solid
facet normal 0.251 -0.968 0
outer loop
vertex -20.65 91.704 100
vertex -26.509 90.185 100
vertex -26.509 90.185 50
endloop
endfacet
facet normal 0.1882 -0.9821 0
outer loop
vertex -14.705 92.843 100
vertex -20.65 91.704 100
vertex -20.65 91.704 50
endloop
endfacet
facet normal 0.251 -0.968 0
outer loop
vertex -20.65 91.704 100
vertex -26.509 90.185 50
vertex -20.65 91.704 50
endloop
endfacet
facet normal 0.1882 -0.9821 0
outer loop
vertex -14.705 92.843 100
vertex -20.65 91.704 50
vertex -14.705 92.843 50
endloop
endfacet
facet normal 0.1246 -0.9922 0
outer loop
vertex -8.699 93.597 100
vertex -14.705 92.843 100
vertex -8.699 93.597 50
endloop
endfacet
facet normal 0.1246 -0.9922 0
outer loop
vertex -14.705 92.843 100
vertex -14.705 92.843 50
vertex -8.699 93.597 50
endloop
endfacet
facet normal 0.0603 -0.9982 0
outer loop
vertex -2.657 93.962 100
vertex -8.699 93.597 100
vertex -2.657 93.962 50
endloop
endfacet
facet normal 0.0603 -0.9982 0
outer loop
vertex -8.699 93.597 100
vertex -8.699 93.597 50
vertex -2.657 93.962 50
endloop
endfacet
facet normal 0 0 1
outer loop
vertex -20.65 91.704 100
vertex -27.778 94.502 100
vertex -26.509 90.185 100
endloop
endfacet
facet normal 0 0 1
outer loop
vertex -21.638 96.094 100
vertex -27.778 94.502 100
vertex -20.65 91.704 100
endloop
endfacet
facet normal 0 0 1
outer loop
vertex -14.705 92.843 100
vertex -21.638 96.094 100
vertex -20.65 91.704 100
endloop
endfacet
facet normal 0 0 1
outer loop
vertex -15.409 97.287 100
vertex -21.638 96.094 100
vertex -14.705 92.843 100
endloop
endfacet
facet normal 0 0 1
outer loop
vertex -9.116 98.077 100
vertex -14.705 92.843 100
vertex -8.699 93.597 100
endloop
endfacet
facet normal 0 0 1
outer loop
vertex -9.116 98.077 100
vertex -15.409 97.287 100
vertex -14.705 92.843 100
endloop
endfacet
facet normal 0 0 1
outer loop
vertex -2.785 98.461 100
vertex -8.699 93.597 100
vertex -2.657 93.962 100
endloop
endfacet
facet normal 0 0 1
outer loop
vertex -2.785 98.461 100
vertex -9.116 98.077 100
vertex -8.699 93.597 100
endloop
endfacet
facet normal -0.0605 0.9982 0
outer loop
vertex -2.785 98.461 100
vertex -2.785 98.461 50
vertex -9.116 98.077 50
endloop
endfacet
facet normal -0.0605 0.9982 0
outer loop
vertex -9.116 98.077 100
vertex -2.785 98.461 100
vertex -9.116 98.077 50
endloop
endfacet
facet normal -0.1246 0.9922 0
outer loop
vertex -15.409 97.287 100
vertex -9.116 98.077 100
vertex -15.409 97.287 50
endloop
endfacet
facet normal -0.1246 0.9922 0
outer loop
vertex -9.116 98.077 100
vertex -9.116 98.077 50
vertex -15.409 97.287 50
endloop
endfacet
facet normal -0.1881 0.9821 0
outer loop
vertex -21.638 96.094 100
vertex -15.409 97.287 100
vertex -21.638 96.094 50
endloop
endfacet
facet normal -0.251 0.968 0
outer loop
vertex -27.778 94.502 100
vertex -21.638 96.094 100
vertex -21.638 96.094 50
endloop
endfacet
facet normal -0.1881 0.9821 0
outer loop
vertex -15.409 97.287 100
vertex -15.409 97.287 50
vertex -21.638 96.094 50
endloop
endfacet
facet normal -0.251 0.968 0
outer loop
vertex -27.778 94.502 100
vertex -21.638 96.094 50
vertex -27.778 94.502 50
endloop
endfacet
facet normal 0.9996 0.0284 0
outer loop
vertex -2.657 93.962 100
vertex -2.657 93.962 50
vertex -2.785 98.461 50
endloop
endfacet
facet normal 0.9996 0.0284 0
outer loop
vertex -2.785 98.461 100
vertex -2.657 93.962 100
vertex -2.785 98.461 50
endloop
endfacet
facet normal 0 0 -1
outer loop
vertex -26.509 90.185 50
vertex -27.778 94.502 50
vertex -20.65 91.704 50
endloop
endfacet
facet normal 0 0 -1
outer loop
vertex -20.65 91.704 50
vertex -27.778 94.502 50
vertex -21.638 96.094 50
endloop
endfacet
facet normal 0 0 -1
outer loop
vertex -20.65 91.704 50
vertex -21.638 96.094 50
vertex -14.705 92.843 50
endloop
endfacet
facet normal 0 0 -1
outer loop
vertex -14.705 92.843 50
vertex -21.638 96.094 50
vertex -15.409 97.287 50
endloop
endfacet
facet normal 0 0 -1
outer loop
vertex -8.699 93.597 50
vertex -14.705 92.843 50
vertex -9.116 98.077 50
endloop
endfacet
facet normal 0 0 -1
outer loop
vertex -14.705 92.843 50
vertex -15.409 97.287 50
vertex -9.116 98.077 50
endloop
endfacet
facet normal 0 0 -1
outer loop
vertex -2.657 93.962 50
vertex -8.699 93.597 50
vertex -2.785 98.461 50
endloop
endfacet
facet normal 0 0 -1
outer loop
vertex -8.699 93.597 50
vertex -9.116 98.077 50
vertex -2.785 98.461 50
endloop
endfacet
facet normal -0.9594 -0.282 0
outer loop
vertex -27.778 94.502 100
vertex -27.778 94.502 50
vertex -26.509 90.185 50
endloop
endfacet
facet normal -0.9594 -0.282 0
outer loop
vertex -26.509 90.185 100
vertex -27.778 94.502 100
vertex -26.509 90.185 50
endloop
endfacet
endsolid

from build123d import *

# Parameters (mm, degrees)
Y_KSEKLIK_EKSTR_ZYON1_DEPTH = 100


with BuildPart() as part:
    # Model → Yükseklik-Ekstrüzyon1 (new body)
    with BuildSketch(Plane.XY):
        with BuildLine():
            Line((-27.777647726, 94.502128478), (-26.508618135, 90.184772354))
            ThreePointArc((-26.508618135, 90.184772354), (-14.704839714, 92.842704016), (-2.657433276, 93.962428919))
            Line((-2.657433276, 93.962428919), (-2.784650827, 98.460630304))
            ThreePointArc((-2.784650827, 98.460630304), (-15.408794806, 97.287301549), (-27.777647726, 94.502128478))
        make_face()
    extrude(amount=Y_KSEKLIK_EKSTR_ZYON1_DEPTH)


with BuildPart() as body_2:
    # Ayır1: the piece on the far side of the plane
    add(part.part)
    split(bisect_by=Plane.XY.offset(50), keep=Keep.BOTTOM)


with BuildPart() as part_1:
    add(part.part)

    # Ayır1
    split(bisect_by=Plane.XY.offset(50), keep=Keep.TOP)


solid = part_1.part
